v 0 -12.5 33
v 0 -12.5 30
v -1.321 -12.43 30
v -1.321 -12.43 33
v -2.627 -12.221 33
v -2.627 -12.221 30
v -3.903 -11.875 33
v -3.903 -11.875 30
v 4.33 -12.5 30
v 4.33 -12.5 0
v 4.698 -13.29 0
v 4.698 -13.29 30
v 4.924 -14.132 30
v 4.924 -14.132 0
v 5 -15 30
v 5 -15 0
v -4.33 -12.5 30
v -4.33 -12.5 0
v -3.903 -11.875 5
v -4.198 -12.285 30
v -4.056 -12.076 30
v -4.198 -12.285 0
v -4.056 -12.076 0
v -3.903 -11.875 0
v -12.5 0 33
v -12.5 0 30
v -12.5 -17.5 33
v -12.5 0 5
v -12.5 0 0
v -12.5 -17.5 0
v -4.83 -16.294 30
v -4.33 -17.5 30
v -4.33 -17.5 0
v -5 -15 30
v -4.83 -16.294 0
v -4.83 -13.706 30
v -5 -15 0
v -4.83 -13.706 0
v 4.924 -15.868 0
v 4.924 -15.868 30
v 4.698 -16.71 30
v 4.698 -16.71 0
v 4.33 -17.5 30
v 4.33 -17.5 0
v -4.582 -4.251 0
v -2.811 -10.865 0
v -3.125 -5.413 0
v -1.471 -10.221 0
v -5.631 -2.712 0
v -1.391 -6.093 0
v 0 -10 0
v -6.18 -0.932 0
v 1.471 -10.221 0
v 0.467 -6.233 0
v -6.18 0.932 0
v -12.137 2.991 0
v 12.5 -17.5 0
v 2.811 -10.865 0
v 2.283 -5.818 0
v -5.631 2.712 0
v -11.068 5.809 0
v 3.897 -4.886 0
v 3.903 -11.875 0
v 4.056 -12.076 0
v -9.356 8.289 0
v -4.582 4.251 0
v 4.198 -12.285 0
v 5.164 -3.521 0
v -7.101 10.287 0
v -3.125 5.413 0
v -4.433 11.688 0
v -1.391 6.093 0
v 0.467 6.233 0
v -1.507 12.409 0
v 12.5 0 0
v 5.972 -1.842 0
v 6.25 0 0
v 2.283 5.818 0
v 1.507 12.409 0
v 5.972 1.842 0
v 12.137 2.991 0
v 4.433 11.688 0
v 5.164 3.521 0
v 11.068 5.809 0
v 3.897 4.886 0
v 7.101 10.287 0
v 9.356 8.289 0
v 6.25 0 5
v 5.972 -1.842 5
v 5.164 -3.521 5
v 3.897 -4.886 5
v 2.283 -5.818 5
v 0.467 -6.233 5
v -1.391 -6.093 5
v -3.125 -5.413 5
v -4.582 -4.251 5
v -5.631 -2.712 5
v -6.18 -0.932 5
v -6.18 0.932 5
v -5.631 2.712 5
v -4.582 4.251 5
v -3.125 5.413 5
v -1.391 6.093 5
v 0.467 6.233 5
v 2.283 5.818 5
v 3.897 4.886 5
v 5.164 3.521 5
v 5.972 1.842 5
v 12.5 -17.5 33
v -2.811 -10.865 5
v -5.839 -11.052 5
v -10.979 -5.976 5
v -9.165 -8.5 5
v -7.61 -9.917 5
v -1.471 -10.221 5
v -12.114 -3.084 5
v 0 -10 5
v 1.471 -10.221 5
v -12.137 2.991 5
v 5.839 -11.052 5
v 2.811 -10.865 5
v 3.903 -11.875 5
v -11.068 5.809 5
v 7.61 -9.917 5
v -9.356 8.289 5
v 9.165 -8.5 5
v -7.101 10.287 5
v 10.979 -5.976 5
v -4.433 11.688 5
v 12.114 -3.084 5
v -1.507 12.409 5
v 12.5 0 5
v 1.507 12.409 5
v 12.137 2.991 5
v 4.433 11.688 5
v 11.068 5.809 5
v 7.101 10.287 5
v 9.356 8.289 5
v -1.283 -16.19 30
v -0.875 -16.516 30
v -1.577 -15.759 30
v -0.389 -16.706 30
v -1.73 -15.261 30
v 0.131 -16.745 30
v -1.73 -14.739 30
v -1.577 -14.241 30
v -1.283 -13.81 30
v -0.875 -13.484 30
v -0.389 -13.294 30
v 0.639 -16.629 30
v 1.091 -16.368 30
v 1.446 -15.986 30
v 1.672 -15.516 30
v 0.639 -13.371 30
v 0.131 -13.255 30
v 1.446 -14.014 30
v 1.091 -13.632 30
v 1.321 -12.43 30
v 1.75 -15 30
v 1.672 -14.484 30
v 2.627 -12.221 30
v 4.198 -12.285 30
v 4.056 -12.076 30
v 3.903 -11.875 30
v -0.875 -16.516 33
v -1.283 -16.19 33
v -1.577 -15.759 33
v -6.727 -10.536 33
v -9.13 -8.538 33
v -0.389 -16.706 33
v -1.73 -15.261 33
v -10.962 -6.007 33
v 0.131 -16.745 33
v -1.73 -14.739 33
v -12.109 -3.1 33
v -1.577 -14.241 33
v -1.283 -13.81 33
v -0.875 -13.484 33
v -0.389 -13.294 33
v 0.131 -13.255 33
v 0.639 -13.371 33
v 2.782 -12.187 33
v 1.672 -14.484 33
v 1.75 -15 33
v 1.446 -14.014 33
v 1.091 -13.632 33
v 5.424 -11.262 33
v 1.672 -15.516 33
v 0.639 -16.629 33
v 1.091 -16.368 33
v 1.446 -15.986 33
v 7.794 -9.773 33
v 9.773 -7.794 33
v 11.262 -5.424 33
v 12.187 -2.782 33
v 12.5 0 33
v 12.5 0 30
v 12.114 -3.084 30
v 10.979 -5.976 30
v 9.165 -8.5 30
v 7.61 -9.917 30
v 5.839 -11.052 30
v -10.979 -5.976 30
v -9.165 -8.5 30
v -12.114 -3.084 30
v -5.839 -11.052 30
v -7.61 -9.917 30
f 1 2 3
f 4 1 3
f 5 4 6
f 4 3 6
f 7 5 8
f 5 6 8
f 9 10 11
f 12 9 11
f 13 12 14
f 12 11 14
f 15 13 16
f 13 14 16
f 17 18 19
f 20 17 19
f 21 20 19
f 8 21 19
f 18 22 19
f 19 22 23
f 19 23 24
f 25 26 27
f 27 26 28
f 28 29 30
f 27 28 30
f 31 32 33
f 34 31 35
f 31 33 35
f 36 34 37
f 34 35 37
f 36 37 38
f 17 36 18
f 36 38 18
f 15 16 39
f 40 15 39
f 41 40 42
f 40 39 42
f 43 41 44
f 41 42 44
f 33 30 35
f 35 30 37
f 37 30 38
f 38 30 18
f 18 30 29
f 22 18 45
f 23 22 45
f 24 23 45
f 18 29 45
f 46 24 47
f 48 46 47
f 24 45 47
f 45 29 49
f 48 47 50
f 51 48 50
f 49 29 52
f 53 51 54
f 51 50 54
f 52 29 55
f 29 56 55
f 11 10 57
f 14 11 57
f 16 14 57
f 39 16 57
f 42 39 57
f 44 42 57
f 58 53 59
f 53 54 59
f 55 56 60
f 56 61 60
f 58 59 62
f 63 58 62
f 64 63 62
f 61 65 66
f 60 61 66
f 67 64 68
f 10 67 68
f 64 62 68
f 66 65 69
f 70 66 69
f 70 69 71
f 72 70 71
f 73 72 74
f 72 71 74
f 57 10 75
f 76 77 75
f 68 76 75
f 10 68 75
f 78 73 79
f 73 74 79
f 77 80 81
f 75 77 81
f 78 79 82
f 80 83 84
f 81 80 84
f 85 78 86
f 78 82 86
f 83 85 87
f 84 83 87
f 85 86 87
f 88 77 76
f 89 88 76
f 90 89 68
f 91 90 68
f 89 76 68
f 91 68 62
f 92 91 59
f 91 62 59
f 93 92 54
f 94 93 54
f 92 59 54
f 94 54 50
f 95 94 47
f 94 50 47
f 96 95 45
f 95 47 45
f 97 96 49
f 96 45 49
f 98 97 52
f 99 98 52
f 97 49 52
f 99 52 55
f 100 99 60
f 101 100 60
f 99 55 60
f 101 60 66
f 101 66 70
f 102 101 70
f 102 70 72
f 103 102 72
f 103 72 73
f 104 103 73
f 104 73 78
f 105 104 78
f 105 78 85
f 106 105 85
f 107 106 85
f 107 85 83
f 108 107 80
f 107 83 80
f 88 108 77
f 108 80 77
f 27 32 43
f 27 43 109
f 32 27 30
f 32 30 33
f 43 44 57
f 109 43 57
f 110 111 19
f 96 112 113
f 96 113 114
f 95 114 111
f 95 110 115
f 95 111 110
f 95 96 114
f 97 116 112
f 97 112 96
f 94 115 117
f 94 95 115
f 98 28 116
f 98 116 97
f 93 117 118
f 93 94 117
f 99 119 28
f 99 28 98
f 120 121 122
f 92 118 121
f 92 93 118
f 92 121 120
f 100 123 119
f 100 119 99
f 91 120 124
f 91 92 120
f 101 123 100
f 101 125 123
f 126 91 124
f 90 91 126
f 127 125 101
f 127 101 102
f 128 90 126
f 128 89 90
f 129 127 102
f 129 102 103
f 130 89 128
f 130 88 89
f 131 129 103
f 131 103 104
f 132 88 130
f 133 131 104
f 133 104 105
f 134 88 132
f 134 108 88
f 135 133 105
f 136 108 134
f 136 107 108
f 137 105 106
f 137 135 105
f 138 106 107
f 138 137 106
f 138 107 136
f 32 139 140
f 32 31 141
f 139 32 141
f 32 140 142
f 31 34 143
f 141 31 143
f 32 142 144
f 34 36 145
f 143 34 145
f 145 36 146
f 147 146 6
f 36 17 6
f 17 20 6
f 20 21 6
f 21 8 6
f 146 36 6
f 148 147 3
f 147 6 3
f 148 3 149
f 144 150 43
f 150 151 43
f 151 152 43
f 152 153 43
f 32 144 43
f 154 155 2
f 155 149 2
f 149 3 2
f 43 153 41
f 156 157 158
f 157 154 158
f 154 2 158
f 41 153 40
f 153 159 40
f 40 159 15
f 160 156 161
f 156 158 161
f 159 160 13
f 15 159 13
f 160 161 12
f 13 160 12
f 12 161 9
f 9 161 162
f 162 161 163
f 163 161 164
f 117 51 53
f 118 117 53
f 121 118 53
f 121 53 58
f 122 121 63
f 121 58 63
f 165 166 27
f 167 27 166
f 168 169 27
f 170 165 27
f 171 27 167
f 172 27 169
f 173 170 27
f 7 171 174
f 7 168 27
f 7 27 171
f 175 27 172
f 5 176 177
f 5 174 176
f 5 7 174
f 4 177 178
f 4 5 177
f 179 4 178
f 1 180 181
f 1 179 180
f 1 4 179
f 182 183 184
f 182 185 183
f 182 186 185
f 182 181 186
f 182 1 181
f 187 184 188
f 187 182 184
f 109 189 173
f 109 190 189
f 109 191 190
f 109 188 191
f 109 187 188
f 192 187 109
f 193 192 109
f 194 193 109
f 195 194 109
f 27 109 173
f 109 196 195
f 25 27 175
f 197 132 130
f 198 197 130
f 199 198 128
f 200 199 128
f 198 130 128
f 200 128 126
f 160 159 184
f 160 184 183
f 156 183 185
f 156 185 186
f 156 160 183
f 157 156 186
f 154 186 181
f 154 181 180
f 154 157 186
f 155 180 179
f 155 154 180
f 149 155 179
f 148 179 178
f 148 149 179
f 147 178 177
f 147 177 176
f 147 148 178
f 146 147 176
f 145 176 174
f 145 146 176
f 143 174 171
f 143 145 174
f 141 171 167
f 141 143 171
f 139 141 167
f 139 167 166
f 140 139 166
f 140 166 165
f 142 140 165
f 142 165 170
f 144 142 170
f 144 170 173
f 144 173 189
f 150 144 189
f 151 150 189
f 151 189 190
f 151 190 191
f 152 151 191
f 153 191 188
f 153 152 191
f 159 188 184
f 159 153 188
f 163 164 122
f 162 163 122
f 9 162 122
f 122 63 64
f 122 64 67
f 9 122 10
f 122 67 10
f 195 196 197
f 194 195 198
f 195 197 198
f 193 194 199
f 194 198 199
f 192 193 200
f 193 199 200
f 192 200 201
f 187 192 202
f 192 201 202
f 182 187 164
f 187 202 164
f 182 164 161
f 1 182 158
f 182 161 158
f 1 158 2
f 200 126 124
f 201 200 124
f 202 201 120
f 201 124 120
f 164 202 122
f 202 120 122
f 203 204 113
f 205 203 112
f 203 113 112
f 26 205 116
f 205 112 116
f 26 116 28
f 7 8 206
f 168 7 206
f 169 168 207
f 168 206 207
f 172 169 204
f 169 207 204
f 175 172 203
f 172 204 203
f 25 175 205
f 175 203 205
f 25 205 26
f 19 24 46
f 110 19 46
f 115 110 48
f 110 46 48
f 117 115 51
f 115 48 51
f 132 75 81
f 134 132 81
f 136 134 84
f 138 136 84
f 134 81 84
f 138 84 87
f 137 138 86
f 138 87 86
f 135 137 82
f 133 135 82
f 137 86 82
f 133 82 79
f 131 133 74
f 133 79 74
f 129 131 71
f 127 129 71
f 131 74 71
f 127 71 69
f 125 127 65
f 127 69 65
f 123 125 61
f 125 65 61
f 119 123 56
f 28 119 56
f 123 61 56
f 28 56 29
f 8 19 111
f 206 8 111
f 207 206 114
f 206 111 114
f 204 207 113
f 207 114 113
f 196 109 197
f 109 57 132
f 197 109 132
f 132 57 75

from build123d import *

# Parameters (mm, degrees)
F1_DEPTH = 5
F2_DEPTH = 30
F3_R     = 1.75
F4_DEPTH = 3


with BuildPart() as f1:
    # F0 (on Top) → F1 (new body)
    with BuildSketch(Plane.XY):
        with BuildLine():
            Line((6.25, 0), (10, 0))
            ThreePointArc((10, 0), (0, 10), (-10, 0))
            Line((-10, 0), (-6.25, 0))
            ThreePointArc((-6.25, 0), (0, 6.25), (6.25, 0))
        make_face()
        with BuildLine():
            Line((12.5, 0), (10, 0))
            ThreePointArc((10, 0), (8.7372269275, -4.8642435813), (5.2678268764, -8.5))
            Line((5.2678268764, -8.5), (9.1651513899, -8.5))
            ThreePointArc((9.1651513899, -8.5), (11.6364597789, -4.5653919671), (12.5, 0))
        make_face()
        with BuildLine():
            ThreePointArc((5.2678268764, -8.5), (8.7372269275, -4.8642435813), (10, 0))
            Line((10, 0), (6.25, 0))
            ThreePointArc((6.25, 0), (0, -6.25), (-6.25, 0))
            Line((-6.25, 0), (-10, 0))
            ThreePointArc((-10, 0), (-8.7372269275, -4.8642435813), (-5.2678268764, -8.5))
            Line((-5.2678268764, -8.5), (5.2678268764, -8.5))
        make_face()
        with BuildLine():
            ThreePointArc((-10, 0), (0, 10), (10, 0))
            Line((10, 0), (12.5, 0))
            ThreePointArc((12.5, 0), (0, 12.5), (-12.5, 0))
            Line((-12.5, 0), (-10, 0))
        make_face()
        with BuildLine():
            ThreePointArc((-5.2678268764, -8.5), (-8.7372269275, -4.8642435813), (-10, 0))
            Line((-10, 0), (-12.5, 0))
            ThreePointArc((-12.5, 0), (-11.6364597789, -4.5653919671), (-9.1651513899, -8.5))
            Line((-9.1651513899, -8.5), (-5.2678268764, -8.5))
        make_face()
        with BuildLine():
            Line((9.1651513899, -8.5), (5.2678268764, -8.5))
            ThreePointArc((5.2678268764, -8.5), (2.7386127875, -9.6176920308), (0, -10))
            ThreePointArc((0, -10), (2.1650635095, -10.4930609057), (3.903123749, -11.875))
            ThreePointArc((3.903123749, -11.875), (6.7485265078, -10.5217579317), (9.1651513899, -8.5))
        make_face()
        with BuildLine():
            ThreePointArc((0, -10), (2.7386127875, -9.6176920308), (5.2678268764, -8.5))
            Line((5.2678268764, -8.5), (-5.2678268764, -8.5))
            ThreePointArc((-5.2678268764, -8.5), (-2.7386127875, -9.6176920308), (0, -10))
        make_face()
        with BuildLine():
            ThreePointArc((0, -10), (-2.7386127875, -9.6176920308), (-5.2678268764, -8.5))
            Line((-5.2678268764, -8.5), (-9.1651513899, -8.5))
            ThreePointArc((-9.1651513899, -8.5), (-6.7485265078, -10.5217579317), (-3.903123749, -11.875))
            ThreePointArc((-3.903123749, -11.875), (-2.1650635095, -10.4930609057), (0, -10))
        make_face()
    extrude(amount=F1_DEPTH)

    # F0 (on Top) → F2 (join)
    with BuildSketch(Plane.XY):
        with BuildLine():
            ThreePointArc((-9.1651513899, -8.5), (-11.6364597789, -4.5653919671), (-12.5, 0))
            Line((-12.5, 0), (-12.5, -8.5))
            Line((-12.5, -8.5), (-9.1651513899, -8.5))
        make_face()
        with BuildLine():
            Line((12.5, -8.5), (12.5, 0))
            ThreePointArc((12.5, 0), (11.6364597789, -4.5653919671), (9.1651513899, -8.5))
            Line((9.1651513899, -8.5), (12.5, -8.5))
        make_face()
        with BuildLine():
            Line((12.5, -8.5), (9.1651513899, -8.5))
            ThreePointArc((9.1651513899, -8.5), (6.7485265078, -10.5217579317), (3.903123749, -11.875))
            ThreePointArc((3.903123749, -11.875), (4.1284695472, -12.1794080057), (4.3301270189, -12.5))
            Line((4.3301270189, -12.5), (12.5, -12.5))
            Line((12.5, -12.5), (12.5, -8.5))
        make_face()
        with BuildLine():
            ThreePointArc((-3.903123749, -11.875), (-6.7485265078, -10.5217579317), (-9.1651513899, -8.5))
            Line((-9.1651513899, -8.5), (-12.5, -8.5))
            Line((-12.5, -8.5), (-12.5, -12.5))
            Line((-12.5, -12.5), (-4.3301270189, -12.5))
            ThreePointArc((-4.3301270189, -12.5), (-4.1284695472, -12.1794080057), (-3.903123749, -11.875))
        make_face()
        with BuildLine():
            Line((-4.3301270189, -12.5), (-12.5, -12.5))
            Line((-12.5, -12.5), (-12.5, -17.5))
            Line((-12.5, -17.5), (-4.3301270189, -17.5))
            ThreePointArc((-4.3301270189, -17.5), (-5, -15), (-4.3301270189, -12.5))
        make_face()
        with BuildLine():
            Line((12.5, -17.5), (12.5, -12.5))
            Line((12.5, -12.5), (4.3301270189, -12.5))
            ThreePointArc((4.3301270189, -12.5), (4.8296291314, -13.7059047745), (5, -15))
            ThreePointArc((5, -15), (4.8296291314, -16.2940952255), (4.3301270189, -17.5))
            Line((4.3301270189, -17.5), (12.5, -17.5))
        make_face()
    extrude(amount=F2_DEPTH)

    # F3 (on face) → F4 (join)
    with BuildSketch(Plane.XY.offset(30)):
        with BuildLine():
            Line((0, -12.5), (-4.3301270189, -12.5))
            ThreePointArc((-4.3301270189, -12.5), (-5, -15), (-4.3301270189, -17.5))
            Line((-4.3301270189, -17.5), (12.5, -17.5))
            Line((12.5, -17.5), (12.5, -12.5))
            Line((12.5, -12.5), (0, -12.5))
        make_face()
        with Locations((0, -15)):
            Circle(F3_R, mode=Mode.SUBTRACT)
        with BuildLine():
            ThreePointArc((-3.903123749, -11.875), (-10.1251925133, -7.3301075414), (-12.5, 0))
            Line((-12.5, 0), (-12.5, -12.5))
            Line((-12.5, -12.5), (-4.3301270189, -12.5))
            ThreePointArc((-4.3301270189, -12.5), (-4.1284695472, -12.1794080057), (-3.903123749, -11.875))
        make_face()
        with BuildLine():
            Line((-4.3301270189, -12.5), (-12.5, -12.5))
            Line((-12.5, -12.5), (-12.5, -17.5))
            Line((-12.5, -17.5), (-4.3301270189, -17.5))
            ThreePointArc((-4.3301270189, -17.5), (-5, -15), (-4.3301270189, -12.5))
        make_face()
        with BuildLine():
            Line((12.5, -12.5), (12.5, 0))
            ThreePointArc((12.5, 0), (8.8388347648, -8.8388347648), (0, -12.5))
            Line((0, -12.5), (12.5, -12.5))
        make_face()
        with BuildLine():
            ThreePointArc((0, -12.5), (-1.9764235376, -12.3427610363), (-3.903123749, -11.875))
            ThreePointArc((-3.903123749, -11.875), (-4.1284695472, -12.1794080057), (-4.3301270189, -12.5))
            Line((-4.3301270189, -12.5), (0, -12.5))
        make_face()
    extrude(amount=F4_DEPTH)


solid = f1.part
